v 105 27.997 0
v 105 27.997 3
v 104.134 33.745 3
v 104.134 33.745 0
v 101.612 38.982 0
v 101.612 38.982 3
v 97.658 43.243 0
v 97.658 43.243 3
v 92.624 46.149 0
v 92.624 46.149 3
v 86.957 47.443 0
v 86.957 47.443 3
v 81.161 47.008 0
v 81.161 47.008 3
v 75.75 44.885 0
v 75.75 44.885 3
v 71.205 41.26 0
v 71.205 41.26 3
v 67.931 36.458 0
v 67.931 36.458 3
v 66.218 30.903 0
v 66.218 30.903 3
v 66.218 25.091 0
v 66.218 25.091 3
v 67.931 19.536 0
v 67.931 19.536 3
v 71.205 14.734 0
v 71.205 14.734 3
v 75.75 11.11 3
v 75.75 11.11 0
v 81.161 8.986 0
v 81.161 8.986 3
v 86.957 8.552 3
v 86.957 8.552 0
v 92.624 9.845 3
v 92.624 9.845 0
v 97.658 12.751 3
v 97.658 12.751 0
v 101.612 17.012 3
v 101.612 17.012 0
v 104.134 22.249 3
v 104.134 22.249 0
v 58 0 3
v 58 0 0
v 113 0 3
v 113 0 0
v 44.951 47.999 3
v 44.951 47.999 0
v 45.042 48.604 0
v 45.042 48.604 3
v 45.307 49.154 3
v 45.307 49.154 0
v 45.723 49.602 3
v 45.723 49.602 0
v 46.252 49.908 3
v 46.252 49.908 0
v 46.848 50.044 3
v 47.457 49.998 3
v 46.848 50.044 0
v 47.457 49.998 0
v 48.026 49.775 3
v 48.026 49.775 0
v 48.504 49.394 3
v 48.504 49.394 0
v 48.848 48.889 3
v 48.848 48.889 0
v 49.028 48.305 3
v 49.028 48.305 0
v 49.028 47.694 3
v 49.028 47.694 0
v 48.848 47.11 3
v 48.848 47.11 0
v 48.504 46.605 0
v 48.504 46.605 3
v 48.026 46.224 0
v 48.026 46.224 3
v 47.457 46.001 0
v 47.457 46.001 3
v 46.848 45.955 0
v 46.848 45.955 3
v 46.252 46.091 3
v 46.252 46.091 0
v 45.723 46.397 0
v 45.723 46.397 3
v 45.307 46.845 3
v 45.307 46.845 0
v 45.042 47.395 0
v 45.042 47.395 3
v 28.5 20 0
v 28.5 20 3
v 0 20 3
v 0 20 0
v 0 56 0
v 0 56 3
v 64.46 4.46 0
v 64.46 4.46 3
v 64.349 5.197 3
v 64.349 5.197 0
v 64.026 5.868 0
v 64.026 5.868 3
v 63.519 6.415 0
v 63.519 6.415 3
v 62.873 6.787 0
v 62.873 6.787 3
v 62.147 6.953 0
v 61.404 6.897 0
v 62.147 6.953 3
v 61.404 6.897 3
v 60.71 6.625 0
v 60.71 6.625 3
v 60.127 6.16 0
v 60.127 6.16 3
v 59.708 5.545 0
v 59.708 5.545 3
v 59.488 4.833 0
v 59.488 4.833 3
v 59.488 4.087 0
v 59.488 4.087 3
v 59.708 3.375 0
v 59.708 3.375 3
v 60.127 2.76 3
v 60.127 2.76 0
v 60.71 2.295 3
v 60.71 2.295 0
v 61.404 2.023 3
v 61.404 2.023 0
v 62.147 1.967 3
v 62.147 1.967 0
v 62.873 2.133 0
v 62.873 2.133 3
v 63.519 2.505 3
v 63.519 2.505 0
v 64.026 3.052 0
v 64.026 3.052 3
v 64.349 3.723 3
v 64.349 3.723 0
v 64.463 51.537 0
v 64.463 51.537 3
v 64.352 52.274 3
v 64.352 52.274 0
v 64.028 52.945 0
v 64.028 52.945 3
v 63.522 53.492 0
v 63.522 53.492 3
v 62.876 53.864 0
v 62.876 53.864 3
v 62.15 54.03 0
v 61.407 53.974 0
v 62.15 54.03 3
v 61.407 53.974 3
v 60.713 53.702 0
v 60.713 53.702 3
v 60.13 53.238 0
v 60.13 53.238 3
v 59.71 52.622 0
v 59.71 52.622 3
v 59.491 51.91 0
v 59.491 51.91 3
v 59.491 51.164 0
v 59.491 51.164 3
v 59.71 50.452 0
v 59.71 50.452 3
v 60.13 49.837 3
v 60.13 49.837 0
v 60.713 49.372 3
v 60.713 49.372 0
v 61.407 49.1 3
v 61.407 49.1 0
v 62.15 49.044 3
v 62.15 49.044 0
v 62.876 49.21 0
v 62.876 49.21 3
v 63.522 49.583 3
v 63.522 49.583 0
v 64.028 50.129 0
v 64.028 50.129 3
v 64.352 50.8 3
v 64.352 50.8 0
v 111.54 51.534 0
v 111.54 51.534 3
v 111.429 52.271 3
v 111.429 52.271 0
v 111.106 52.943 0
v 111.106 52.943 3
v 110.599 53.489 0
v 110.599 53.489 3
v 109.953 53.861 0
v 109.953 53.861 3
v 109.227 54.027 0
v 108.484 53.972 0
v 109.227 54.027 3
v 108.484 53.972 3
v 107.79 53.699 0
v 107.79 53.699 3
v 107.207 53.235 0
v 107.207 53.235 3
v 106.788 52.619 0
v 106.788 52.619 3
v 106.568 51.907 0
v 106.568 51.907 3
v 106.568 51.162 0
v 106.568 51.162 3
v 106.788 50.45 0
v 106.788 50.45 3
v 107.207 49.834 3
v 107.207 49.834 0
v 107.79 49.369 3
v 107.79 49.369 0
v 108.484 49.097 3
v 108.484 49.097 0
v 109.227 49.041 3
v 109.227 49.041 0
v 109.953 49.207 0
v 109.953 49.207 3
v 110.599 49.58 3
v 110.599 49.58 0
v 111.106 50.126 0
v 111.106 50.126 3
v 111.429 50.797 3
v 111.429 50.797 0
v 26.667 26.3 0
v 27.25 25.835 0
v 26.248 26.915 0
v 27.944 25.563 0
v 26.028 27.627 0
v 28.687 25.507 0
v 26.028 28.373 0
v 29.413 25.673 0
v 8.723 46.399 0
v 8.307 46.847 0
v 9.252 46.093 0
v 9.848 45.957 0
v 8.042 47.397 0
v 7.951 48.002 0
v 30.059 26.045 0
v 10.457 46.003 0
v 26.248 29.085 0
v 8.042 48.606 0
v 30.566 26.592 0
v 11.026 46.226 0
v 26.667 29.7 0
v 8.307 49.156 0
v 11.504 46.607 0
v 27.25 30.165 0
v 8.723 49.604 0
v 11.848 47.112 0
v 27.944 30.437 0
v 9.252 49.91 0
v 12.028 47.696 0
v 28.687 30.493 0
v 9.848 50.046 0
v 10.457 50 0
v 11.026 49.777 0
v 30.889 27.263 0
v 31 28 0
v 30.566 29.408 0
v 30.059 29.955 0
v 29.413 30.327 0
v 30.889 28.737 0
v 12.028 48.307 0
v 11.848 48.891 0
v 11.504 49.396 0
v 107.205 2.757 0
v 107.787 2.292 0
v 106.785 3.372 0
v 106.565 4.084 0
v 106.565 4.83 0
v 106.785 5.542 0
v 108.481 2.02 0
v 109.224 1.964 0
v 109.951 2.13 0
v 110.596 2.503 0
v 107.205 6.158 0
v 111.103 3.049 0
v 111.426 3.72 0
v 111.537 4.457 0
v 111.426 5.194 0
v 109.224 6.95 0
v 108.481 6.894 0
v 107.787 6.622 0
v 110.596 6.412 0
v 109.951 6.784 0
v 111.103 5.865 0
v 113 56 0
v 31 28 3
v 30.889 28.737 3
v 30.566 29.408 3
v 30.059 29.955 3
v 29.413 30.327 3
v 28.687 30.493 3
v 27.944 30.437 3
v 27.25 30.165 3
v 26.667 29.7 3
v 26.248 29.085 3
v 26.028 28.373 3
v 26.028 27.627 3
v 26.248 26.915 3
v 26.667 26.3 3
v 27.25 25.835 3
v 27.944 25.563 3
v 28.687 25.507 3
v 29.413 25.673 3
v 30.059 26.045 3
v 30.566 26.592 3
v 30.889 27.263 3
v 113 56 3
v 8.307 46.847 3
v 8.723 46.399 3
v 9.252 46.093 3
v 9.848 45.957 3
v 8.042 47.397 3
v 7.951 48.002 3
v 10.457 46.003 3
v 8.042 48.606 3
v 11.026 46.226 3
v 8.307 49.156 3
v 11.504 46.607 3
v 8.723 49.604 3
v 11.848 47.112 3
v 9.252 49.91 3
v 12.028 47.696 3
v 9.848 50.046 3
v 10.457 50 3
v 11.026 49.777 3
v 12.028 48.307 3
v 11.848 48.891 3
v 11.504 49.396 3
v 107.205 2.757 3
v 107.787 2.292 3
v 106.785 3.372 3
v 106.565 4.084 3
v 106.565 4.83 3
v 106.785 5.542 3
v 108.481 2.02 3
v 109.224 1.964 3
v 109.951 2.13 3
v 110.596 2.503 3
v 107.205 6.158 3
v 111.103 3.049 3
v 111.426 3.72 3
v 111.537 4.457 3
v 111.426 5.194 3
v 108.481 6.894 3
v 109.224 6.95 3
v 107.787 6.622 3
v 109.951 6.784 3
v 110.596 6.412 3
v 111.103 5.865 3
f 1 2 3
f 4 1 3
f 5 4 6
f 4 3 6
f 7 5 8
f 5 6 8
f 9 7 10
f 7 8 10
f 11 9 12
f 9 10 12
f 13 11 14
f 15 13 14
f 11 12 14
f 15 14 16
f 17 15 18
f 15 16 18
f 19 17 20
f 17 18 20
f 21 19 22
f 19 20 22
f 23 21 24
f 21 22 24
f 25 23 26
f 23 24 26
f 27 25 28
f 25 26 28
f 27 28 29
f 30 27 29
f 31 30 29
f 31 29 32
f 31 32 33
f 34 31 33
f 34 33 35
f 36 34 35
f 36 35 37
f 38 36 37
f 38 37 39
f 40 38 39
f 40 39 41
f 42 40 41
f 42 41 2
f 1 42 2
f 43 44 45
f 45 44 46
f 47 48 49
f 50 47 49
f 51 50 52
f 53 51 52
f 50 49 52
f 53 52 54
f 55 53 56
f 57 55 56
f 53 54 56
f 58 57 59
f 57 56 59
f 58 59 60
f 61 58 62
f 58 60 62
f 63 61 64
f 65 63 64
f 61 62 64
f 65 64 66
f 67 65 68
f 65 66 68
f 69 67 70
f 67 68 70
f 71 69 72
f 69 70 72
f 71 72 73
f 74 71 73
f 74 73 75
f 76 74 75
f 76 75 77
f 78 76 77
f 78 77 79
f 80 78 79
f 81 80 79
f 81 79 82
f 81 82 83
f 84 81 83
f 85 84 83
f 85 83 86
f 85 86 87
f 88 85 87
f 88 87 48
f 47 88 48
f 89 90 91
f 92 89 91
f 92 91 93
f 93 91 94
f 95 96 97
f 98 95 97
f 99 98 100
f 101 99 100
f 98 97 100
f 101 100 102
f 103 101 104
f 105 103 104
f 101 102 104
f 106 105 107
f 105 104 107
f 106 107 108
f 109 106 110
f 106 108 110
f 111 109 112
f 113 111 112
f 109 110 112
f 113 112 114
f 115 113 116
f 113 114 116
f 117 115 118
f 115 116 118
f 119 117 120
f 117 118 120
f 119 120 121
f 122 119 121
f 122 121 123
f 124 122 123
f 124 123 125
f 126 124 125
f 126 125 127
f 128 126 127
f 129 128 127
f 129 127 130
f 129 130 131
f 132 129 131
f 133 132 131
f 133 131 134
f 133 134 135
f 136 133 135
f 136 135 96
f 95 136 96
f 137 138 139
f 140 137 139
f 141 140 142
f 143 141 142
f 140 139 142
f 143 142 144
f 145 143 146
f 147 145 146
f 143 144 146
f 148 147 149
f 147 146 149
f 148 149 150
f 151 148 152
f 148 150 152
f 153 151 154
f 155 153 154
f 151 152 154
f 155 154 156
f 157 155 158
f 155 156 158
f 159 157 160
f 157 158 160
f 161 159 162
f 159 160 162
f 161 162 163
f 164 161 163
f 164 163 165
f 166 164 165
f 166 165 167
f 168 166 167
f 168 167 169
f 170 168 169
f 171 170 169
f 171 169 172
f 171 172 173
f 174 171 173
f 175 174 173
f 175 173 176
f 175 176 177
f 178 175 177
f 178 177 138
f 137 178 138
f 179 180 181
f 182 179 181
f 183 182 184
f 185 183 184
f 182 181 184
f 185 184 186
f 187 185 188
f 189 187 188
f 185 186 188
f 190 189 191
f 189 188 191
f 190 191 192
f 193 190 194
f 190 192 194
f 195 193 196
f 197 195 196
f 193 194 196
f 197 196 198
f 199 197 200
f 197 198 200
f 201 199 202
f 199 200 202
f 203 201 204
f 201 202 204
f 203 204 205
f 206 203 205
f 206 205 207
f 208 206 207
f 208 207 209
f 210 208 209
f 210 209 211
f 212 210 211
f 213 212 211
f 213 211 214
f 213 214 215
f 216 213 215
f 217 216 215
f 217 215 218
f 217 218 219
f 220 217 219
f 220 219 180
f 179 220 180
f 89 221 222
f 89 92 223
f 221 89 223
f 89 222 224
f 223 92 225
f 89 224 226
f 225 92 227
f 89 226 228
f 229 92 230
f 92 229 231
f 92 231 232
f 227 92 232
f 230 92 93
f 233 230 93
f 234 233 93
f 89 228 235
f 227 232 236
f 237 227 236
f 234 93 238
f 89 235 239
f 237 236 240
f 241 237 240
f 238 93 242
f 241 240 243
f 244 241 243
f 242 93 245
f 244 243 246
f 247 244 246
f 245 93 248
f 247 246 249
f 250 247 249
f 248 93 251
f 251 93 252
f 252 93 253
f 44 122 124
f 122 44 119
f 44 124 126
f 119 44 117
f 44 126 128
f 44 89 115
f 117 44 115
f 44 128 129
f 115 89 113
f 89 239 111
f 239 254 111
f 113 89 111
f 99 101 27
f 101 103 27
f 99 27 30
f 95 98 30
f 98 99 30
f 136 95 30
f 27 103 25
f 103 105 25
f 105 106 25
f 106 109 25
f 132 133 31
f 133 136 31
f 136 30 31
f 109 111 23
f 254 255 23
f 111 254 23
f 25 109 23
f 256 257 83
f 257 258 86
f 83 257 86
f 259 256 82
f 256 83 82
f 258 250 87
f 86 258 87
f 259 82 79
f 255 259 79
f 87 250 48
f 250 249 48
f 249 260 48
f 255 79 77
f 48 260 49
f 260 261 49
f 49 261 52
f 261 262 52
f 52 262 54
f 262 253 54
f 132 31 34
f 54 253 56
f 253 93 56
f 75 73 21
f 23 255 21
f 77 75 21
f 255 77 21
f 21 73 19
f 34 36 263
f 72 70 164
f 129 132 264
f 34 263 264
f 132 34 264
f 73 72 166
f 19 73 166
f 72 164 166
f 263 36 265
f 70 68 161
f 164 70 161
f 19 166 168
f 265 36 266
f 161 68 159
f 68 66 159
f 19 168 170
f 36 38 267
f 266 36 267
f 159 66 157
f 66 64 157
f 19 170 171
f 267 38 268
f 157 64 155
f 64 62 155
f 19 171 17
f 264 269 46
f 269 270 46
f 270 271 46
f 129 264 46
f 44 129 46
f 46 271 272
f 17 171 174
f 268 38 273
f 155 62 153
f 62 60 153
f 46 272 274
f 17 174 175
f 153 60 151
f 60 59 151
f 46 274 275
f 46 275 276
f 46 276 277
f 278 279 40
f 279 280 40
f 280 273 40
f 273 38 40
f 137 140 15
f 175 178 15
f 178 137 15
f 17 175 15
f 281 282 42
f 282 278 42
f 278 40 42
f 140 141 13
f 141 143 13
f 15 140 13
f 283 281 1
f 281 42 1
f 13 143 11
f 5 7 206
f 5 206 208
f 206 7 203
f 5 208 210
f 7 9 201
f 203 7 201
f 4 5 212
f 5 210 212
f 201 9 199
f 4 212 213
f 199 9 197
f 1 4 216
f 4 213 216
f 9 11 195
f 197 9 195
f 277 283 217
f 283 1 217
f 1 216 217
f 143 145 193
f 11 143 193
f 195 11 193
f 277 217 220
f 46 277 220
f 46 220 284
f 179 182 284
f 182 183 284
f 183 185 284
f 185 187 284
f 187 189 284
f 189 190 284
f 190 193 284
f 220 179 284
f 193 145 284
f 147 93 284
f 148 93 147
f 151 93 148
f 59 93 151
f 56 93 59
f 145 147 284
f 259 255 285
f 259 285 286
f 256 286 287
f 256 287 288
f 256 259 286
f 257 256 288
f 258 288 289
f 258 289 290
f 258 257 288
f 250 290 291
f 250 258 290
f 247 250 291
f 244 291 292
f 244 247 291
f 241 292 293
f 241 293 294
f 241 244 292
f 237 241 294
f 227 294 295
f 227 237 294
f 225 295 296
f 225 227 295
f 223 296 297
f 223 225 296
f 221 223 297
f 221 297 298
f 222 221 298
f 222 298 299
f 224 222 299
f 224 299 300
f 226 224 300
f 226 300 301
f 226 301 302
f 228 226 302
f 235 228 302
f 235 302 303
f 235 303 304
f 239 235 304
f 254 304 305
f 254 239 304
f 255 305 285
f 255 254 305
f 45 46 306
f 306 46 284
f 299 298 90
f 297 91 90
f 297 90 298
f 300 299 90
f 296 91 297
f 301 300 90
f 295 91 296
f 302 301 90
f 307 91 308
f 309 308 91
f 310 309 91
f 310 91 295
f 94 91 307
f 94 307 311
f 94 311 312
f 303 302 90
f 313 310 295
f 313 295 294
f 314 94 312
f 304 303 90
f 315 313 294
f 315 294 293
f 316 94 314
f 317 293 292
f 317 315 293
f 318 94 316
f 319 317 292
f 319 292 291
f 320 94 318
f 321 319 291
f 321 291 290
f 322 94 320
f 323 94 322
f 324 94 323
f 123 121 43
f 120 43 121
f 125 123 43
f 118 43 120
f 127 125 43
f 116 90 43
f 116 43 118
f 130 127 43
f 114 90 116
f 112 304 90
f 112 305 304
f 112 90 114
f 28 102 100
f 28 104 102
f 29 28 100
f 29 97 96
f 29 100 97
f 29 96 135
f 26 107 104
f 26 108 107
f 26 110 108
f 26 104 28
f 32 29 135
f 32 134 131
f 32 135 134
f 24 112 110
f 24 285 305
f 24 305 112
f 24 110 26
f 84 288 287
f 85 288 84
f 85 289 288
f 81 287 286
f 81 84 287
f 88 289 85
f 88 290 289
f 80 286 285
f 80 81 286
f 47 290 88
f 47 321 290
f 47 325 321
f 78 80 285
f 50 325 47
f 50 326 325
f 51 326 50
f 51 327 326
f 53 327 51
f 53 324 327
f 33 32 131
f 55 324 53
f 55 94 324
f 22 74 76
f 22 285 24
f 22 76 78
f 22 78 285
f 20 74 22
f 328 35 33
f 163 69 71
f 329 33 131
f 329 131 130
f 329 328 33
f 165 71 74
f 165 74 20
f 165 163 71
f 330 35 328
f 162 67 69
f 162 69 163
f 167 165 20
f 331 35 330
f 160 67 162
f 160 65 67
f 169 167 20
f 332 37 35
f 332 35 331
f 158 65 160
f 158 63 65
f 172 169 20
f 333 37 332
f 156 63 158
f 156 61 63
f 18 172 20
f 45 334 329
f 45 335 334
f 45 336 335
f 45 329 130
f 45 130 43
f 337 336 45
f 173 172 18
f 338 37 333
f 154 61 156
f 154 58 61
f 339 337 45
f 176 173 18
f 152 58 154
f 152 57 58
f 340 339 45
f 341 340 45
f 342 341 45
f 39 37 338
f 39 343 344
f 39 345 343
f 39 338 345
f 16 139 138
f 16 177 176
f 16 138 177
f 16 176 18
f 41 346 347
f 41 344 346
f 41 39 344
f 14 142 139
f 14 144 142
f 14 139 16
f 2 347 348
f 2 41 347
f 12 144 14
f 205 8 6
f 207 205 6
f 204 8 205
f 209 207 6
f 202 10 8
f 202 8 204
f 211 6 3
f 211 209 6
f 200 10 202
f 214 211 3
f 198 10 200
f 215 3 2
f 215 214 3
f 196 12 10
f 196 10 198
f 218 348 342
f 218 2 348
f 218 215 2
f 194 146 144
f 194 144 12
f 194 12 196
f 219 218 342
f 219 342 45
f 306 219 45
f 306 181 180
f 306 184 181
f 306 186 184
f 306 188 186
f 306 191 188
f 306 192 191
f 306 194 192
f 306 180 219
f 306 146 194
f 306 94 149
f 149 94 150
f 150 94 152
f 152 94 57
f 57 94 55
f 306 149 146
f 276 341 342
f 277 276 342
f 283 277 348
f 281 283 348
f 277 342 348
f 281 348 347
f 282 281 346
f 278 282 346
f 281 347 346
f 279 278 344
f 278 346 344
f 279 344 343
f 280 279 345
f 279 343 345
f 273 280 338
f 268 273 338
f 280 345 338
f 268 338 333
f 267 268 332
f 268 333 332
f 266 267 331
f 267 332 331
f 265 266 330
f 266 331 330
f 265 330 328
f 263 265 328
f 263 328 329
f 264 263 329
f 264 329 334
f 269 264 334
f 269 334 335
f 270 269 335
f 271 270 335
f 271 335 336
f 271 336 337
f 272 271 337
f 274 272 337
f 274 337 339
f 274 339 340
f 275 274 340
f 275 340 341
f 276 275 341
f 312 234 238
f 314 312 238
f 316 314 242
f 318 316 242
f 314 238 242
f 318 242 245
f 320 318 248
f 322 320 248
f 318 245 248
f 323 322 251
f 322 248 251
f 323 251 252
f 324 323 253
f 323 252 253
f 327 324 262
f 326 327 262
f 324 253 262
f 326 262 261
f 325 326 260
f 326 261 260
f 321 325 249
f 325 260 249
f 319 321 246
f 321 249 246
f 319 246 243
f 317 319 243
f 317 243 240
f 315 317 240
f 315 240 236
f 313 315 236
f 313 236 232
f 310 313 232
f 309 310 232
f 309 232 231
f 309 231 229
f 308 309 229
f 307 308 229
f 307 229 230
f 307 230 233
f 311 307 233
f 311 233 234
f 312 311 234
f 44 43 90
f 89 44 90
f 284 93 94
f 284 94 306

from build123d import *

# Parameters (mm, degrees)
SKETCH1_W           = 113
SKETCH1_H           = 56
SKETCH1_R           = 2.5
BOSS_EXTRUDE1_DEPTH = 3
CUT_EXTRUDE1_DEPTH  = 3
SKETCH3_R           = 2.05
CUT_EXTRUDE2_DEPTH  = 10
SKETCH5_R           = 19.5
SKETCH5_R_2         = 2.5
CUT_EXTRUDE4_DEPTH  = 10


with BuildPart() as part:
    # Sketch1 → Boss-Extrude1 (new body)
    with BuildSketch(Plane.XY):
        with Locations((56.5, 28)):
            Rectangle(SKETCH1_W, SKETCH1_H)
        with Locations((28.5, 28)):
            Circle(SKETCH1_R, mode=Mode.SUBTRACT)
    extrude(amount=BOSS_EXTRUDE1_DEPTH)

    # Sketch2 → Cut-Extrude1 (cut)
    with BuildSketch(Plane.XY.offset(3)):
        Polygon((58, 0), (28.5, 20), (0, 20), (0, 28), (-30.035464335, 6.528850882), (11.479915888, -13.732243772), align=None)
    extrude(amount=-CUT_EXTRUDE1_DEPTH, mode=Mode.SUBTRACT)

    # Sketch3 → Cut-Extrude2 (cut)
    with BuildSketch(Plane(origin=(0, 0, 0), x_dir=(-1, 0, 0), z_dir=(0, 0, -1))):
        with Locations((-47.001204436, 47.999419281)):
            Circle(SKETCH3_R)
        with Locations((-10.001204503, 48.001647488)):
            Circle(SKETCH3_R)
    extrude(amount=-CUT_EXTRUDE2_DEPTH, mode=Mode.SUBTRACT)

    # Sketch5 → Cut-Extrude4 (cut)
    with BuildSketch(Plane.XY.offset(3)):
        with Locations((85.499999929, 27.997100776)):
            Circle(SKETCH5_R)
        with Locations((109.039999656, 51.534265429)):
            Circle(SKETCH5_R_2)
        with Locations((61.962835275, 51.537100503)):
            Circle(SKETCH5_R_2)
        with Locations((109.037164582, 4.457101048)):
            Circle(SKETCH5_R_2)
        with Locations((61.960000201, 4.459936122)):
            Circle(SKETCH5_R_2)
    extrude(amount=-CUT_EXTRUDE4_DEPTH, mode=Mode.SUBTRACT)


solid = part.part
